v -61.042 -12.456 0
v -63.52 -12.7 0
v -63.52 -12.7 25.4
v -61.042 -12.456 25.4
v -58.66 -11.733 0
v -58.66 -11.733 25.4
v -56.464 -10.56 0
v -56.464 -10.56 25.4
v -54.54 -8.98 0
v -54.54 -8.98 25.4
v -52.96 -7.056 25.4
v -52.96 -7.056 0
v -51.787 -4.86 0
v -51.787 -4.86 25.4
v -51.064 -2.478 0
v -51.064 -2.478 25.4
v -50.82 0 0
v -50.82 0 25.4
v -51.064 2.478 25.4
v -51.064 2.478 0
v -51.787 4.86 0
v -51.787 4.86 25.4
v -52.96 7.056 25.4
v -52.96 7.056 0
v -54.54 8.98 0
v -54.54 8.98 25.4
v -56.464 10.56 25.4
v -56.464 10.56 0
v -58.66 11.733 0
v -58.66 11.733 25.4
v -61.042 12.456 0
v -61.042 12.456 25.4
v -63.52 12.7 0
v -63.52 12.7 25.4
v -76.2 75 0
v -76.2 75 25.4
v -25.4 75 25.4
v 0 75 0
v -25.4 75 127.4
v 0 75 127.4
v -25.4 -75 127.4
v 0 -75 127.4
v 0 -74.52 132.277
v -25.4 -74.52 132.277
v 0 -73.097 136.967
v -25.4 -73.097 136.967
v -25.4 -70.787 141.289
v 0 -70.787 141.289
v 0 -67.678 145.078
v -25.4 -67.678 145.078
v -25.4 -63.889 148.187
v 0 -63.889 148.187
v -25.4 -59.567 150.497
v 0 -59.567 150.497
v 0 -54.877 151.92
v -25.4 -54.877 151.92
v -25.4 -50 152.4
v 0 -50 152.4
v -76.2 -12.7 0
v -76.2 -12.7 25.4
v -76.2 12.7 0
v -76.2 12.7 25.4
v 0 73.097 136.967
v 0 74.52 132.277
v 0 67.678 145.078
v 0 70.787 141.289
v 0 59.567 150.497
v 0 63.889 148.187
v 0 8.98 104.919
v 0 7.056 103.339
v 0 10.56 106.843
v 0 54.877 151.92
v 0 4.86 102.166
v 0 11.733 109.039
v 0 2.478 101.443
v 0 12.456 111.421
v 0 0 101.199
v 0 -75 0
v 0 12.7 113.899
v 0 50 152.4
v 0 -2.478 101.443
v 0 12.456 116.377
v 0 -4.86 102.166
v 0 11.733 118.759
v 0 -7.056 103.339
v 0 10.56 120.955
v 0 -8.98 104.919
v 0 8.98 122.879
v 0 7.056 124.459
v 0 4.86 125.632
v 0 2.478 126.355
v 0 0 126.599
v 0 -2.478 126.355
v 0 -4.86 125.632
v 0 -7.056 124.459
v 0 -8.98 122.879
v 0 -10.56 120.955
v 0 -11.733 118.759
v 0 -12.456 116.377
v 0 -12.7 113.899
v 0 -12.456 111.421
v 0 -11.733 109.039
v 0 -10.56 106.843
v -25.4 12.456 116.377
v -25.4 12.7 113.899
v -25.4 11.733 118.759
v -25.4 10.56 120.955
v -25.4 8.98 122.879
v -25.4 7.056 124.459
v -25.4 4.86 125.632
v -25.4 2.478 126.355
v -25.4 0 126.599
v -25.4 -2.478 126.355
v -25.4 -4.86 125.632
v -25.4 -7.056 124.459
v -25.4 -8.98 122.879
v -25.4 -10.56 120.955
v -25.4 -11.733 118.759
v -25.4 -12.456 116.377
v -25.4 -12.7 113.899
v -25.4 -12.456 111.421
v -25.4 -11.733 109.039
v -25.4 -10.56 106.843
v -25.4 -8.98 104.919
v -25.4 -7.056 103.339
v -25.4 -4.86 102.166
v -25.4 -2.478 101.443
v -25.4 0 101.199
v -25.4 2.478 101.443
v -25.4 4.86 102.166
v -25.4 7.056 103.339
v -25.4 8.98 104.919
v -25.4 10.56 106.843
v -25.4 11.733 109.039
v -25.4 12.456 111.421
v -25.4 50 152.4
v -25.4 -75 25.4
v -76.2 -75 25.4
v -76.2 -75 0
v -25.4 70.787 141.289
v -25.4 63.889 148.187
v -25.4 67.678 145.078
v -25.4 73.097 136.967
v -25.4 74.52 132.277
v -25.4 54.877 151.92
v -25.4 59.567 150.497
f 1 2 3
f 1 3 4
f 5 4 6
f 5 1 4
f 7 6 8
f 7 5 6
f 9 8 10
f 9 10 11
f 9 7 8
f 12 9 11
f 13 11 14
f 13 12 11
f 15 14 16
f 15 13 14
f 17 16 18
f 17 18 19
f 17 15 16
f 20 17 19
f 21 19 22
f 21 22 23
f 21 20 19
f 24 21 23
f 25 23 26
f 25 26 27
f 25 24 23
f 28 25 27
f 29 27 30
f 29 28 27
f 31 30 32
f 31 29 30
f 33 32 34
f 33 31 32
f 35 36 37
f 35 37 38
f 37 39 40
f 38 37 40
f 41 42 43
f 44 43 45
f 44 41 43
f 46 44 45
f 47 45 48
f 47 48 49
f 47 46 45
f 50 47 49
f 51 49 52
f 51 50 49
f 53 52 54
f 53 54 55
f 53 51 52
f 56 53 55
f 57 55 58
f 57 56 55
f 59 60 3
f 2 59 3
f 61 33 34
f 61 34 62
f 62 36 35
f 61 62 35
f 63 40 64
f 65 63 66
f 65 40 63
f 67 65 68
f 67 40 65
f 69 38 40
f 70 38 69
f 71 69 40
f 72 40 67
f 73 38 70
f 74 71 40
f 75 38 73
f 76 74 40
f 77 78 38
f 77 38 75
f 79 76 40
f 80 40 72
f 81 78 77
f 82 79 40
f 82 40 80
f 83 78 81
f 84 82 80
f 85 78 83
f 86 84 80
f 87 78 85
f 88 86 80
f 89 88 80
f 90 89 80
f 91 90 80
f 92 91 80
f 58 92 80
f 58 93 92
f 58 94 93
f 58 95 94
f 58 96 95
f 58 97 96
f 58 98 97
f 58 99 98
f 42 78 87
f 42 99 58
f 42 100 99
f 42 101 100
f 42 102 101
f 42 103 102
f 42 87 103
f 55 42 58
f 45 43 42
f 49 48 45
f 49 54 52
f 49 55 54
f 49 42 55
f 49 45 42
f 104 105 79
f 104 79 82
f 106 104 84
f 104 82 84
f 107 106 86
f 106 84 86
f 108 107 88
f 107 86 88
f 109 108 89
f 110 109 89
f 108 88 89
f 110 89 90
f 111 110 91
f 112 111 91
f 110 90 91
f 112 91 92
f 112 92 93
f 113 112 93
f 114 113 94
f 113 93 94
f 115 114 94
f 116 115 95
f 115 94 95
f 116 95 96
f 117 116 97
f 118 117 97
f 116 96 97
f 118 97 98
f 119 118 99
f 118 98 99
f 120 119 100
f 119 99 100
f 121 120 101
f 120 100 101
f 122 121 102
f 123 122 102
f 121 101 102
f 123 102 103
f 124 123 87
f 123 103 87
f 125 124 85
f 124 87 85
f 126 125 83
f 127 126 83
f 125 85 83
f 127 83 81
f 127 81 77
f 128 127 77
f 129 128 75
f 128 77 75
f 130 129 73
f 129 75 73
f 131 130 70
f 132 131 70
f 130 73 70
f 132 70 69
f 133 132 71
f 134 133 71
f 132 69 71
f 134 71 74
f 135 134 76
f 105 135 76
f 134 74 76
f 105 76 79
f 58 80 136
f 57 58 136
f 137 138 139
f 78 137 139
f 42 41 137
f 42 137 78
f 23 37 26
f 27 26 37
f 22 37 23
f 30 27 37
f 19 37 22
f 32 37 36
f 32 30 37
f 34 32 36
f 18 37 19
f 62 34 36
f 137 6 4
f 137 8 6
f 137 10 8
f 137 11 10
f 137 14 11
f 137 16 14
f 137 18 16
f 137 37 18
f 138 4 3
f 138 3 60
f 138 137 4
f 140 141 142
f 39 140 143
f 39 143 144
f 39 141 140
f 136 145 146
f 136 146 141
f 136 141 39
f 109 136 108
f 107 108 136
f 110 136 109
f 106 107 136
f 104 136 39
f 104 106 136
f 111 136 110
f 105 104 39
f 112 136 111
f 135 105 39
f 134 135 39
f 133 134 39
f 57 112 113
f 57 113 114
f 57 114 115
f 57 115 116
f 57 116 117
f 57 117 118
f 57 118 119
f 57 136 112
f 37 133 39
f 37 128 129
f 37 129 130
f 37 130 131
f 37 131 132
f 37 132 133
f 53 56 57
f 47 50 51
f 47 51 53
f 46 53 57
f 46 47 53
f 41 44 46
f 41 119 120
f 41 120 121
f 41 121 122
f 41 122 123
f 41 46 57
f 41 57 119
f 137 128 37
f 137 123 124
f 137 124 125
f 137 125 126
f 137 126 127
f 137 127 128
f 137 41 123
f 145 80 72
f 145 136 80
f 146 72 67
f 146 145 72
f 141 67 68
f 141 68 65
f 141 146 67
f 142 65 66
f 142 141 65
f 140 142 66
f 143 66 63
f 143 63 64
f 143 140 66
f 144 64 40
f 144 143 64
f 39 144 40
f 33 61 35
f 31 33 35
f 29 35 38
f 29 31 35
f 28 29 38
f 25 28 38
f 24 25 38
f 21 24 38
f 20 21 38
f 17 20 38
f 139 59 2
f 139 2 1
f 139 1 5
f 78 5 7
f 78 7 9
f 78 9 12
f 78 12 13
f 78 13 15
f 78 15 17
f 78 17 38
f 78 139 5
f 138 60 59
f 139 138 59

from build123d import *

# Parameters (mm, degrees)
F1_DEPTH = 74.999977
F2_R     = 12.7
F3_DEPTH = 25.4
F5_DEPTH = 25.4
F6_R     = 25.000001
F7_R     = 25.000001


with BuildPart() as f1:
    # F0 (on Front) → F1 (new body, symmetric)
    with BuildSketch(Plane.XZ):
        Polygon((-76.2, 0), (0, 0), (0, 152.4), (-25.4, 152.4), (-25.4, 25.4), (-76.2, 25.4), align=None)
    extrude(amount=F1_DEPTH, both=True)

    # F2 (on Right) → F3 (cut)
    with BuildSketch(Plane.YZ):
        with Locations((0, 113.898948)):
            Circle(F2_R)
    extrude(amount=-F3_DEPTH, mode=Mode.SUBTRACT)

    # F4 (on Top) → F5 (cut)
    with BuildSketch(Plane.XY):
        with BuildLine():
            ThreePointArc((-63.519787, -12.7), (-50.819787, 0), (-63.519787, 12.7))
            Line((-63.519787, 12.7), (-76.219787, 12.7))
            Line((-76.219787, 12.7), (-76.219787, -12.7))
            Line((-76.219787, -12.7), (-63.519787, -12.7))
        make_face()
    extrude(amount=F5_DEPTH, mode=Mode.SUBTRACT)

    # F6
    f6_edges = [f1.edges().sort_by_distance(p)[0] for p in [
        (-12.7, -74.999977, 152.4),
    ]]
    fillet(f6_edges, radius=F6_R)

    # F7
    f7_edges = [f1.edges().sort_by_distance(p)[0] for p in [
        (-12.7, 74.999977, 152.4),
    ]]
    fillet(f7_edges, radius=F7_R)


solid = f1.part
